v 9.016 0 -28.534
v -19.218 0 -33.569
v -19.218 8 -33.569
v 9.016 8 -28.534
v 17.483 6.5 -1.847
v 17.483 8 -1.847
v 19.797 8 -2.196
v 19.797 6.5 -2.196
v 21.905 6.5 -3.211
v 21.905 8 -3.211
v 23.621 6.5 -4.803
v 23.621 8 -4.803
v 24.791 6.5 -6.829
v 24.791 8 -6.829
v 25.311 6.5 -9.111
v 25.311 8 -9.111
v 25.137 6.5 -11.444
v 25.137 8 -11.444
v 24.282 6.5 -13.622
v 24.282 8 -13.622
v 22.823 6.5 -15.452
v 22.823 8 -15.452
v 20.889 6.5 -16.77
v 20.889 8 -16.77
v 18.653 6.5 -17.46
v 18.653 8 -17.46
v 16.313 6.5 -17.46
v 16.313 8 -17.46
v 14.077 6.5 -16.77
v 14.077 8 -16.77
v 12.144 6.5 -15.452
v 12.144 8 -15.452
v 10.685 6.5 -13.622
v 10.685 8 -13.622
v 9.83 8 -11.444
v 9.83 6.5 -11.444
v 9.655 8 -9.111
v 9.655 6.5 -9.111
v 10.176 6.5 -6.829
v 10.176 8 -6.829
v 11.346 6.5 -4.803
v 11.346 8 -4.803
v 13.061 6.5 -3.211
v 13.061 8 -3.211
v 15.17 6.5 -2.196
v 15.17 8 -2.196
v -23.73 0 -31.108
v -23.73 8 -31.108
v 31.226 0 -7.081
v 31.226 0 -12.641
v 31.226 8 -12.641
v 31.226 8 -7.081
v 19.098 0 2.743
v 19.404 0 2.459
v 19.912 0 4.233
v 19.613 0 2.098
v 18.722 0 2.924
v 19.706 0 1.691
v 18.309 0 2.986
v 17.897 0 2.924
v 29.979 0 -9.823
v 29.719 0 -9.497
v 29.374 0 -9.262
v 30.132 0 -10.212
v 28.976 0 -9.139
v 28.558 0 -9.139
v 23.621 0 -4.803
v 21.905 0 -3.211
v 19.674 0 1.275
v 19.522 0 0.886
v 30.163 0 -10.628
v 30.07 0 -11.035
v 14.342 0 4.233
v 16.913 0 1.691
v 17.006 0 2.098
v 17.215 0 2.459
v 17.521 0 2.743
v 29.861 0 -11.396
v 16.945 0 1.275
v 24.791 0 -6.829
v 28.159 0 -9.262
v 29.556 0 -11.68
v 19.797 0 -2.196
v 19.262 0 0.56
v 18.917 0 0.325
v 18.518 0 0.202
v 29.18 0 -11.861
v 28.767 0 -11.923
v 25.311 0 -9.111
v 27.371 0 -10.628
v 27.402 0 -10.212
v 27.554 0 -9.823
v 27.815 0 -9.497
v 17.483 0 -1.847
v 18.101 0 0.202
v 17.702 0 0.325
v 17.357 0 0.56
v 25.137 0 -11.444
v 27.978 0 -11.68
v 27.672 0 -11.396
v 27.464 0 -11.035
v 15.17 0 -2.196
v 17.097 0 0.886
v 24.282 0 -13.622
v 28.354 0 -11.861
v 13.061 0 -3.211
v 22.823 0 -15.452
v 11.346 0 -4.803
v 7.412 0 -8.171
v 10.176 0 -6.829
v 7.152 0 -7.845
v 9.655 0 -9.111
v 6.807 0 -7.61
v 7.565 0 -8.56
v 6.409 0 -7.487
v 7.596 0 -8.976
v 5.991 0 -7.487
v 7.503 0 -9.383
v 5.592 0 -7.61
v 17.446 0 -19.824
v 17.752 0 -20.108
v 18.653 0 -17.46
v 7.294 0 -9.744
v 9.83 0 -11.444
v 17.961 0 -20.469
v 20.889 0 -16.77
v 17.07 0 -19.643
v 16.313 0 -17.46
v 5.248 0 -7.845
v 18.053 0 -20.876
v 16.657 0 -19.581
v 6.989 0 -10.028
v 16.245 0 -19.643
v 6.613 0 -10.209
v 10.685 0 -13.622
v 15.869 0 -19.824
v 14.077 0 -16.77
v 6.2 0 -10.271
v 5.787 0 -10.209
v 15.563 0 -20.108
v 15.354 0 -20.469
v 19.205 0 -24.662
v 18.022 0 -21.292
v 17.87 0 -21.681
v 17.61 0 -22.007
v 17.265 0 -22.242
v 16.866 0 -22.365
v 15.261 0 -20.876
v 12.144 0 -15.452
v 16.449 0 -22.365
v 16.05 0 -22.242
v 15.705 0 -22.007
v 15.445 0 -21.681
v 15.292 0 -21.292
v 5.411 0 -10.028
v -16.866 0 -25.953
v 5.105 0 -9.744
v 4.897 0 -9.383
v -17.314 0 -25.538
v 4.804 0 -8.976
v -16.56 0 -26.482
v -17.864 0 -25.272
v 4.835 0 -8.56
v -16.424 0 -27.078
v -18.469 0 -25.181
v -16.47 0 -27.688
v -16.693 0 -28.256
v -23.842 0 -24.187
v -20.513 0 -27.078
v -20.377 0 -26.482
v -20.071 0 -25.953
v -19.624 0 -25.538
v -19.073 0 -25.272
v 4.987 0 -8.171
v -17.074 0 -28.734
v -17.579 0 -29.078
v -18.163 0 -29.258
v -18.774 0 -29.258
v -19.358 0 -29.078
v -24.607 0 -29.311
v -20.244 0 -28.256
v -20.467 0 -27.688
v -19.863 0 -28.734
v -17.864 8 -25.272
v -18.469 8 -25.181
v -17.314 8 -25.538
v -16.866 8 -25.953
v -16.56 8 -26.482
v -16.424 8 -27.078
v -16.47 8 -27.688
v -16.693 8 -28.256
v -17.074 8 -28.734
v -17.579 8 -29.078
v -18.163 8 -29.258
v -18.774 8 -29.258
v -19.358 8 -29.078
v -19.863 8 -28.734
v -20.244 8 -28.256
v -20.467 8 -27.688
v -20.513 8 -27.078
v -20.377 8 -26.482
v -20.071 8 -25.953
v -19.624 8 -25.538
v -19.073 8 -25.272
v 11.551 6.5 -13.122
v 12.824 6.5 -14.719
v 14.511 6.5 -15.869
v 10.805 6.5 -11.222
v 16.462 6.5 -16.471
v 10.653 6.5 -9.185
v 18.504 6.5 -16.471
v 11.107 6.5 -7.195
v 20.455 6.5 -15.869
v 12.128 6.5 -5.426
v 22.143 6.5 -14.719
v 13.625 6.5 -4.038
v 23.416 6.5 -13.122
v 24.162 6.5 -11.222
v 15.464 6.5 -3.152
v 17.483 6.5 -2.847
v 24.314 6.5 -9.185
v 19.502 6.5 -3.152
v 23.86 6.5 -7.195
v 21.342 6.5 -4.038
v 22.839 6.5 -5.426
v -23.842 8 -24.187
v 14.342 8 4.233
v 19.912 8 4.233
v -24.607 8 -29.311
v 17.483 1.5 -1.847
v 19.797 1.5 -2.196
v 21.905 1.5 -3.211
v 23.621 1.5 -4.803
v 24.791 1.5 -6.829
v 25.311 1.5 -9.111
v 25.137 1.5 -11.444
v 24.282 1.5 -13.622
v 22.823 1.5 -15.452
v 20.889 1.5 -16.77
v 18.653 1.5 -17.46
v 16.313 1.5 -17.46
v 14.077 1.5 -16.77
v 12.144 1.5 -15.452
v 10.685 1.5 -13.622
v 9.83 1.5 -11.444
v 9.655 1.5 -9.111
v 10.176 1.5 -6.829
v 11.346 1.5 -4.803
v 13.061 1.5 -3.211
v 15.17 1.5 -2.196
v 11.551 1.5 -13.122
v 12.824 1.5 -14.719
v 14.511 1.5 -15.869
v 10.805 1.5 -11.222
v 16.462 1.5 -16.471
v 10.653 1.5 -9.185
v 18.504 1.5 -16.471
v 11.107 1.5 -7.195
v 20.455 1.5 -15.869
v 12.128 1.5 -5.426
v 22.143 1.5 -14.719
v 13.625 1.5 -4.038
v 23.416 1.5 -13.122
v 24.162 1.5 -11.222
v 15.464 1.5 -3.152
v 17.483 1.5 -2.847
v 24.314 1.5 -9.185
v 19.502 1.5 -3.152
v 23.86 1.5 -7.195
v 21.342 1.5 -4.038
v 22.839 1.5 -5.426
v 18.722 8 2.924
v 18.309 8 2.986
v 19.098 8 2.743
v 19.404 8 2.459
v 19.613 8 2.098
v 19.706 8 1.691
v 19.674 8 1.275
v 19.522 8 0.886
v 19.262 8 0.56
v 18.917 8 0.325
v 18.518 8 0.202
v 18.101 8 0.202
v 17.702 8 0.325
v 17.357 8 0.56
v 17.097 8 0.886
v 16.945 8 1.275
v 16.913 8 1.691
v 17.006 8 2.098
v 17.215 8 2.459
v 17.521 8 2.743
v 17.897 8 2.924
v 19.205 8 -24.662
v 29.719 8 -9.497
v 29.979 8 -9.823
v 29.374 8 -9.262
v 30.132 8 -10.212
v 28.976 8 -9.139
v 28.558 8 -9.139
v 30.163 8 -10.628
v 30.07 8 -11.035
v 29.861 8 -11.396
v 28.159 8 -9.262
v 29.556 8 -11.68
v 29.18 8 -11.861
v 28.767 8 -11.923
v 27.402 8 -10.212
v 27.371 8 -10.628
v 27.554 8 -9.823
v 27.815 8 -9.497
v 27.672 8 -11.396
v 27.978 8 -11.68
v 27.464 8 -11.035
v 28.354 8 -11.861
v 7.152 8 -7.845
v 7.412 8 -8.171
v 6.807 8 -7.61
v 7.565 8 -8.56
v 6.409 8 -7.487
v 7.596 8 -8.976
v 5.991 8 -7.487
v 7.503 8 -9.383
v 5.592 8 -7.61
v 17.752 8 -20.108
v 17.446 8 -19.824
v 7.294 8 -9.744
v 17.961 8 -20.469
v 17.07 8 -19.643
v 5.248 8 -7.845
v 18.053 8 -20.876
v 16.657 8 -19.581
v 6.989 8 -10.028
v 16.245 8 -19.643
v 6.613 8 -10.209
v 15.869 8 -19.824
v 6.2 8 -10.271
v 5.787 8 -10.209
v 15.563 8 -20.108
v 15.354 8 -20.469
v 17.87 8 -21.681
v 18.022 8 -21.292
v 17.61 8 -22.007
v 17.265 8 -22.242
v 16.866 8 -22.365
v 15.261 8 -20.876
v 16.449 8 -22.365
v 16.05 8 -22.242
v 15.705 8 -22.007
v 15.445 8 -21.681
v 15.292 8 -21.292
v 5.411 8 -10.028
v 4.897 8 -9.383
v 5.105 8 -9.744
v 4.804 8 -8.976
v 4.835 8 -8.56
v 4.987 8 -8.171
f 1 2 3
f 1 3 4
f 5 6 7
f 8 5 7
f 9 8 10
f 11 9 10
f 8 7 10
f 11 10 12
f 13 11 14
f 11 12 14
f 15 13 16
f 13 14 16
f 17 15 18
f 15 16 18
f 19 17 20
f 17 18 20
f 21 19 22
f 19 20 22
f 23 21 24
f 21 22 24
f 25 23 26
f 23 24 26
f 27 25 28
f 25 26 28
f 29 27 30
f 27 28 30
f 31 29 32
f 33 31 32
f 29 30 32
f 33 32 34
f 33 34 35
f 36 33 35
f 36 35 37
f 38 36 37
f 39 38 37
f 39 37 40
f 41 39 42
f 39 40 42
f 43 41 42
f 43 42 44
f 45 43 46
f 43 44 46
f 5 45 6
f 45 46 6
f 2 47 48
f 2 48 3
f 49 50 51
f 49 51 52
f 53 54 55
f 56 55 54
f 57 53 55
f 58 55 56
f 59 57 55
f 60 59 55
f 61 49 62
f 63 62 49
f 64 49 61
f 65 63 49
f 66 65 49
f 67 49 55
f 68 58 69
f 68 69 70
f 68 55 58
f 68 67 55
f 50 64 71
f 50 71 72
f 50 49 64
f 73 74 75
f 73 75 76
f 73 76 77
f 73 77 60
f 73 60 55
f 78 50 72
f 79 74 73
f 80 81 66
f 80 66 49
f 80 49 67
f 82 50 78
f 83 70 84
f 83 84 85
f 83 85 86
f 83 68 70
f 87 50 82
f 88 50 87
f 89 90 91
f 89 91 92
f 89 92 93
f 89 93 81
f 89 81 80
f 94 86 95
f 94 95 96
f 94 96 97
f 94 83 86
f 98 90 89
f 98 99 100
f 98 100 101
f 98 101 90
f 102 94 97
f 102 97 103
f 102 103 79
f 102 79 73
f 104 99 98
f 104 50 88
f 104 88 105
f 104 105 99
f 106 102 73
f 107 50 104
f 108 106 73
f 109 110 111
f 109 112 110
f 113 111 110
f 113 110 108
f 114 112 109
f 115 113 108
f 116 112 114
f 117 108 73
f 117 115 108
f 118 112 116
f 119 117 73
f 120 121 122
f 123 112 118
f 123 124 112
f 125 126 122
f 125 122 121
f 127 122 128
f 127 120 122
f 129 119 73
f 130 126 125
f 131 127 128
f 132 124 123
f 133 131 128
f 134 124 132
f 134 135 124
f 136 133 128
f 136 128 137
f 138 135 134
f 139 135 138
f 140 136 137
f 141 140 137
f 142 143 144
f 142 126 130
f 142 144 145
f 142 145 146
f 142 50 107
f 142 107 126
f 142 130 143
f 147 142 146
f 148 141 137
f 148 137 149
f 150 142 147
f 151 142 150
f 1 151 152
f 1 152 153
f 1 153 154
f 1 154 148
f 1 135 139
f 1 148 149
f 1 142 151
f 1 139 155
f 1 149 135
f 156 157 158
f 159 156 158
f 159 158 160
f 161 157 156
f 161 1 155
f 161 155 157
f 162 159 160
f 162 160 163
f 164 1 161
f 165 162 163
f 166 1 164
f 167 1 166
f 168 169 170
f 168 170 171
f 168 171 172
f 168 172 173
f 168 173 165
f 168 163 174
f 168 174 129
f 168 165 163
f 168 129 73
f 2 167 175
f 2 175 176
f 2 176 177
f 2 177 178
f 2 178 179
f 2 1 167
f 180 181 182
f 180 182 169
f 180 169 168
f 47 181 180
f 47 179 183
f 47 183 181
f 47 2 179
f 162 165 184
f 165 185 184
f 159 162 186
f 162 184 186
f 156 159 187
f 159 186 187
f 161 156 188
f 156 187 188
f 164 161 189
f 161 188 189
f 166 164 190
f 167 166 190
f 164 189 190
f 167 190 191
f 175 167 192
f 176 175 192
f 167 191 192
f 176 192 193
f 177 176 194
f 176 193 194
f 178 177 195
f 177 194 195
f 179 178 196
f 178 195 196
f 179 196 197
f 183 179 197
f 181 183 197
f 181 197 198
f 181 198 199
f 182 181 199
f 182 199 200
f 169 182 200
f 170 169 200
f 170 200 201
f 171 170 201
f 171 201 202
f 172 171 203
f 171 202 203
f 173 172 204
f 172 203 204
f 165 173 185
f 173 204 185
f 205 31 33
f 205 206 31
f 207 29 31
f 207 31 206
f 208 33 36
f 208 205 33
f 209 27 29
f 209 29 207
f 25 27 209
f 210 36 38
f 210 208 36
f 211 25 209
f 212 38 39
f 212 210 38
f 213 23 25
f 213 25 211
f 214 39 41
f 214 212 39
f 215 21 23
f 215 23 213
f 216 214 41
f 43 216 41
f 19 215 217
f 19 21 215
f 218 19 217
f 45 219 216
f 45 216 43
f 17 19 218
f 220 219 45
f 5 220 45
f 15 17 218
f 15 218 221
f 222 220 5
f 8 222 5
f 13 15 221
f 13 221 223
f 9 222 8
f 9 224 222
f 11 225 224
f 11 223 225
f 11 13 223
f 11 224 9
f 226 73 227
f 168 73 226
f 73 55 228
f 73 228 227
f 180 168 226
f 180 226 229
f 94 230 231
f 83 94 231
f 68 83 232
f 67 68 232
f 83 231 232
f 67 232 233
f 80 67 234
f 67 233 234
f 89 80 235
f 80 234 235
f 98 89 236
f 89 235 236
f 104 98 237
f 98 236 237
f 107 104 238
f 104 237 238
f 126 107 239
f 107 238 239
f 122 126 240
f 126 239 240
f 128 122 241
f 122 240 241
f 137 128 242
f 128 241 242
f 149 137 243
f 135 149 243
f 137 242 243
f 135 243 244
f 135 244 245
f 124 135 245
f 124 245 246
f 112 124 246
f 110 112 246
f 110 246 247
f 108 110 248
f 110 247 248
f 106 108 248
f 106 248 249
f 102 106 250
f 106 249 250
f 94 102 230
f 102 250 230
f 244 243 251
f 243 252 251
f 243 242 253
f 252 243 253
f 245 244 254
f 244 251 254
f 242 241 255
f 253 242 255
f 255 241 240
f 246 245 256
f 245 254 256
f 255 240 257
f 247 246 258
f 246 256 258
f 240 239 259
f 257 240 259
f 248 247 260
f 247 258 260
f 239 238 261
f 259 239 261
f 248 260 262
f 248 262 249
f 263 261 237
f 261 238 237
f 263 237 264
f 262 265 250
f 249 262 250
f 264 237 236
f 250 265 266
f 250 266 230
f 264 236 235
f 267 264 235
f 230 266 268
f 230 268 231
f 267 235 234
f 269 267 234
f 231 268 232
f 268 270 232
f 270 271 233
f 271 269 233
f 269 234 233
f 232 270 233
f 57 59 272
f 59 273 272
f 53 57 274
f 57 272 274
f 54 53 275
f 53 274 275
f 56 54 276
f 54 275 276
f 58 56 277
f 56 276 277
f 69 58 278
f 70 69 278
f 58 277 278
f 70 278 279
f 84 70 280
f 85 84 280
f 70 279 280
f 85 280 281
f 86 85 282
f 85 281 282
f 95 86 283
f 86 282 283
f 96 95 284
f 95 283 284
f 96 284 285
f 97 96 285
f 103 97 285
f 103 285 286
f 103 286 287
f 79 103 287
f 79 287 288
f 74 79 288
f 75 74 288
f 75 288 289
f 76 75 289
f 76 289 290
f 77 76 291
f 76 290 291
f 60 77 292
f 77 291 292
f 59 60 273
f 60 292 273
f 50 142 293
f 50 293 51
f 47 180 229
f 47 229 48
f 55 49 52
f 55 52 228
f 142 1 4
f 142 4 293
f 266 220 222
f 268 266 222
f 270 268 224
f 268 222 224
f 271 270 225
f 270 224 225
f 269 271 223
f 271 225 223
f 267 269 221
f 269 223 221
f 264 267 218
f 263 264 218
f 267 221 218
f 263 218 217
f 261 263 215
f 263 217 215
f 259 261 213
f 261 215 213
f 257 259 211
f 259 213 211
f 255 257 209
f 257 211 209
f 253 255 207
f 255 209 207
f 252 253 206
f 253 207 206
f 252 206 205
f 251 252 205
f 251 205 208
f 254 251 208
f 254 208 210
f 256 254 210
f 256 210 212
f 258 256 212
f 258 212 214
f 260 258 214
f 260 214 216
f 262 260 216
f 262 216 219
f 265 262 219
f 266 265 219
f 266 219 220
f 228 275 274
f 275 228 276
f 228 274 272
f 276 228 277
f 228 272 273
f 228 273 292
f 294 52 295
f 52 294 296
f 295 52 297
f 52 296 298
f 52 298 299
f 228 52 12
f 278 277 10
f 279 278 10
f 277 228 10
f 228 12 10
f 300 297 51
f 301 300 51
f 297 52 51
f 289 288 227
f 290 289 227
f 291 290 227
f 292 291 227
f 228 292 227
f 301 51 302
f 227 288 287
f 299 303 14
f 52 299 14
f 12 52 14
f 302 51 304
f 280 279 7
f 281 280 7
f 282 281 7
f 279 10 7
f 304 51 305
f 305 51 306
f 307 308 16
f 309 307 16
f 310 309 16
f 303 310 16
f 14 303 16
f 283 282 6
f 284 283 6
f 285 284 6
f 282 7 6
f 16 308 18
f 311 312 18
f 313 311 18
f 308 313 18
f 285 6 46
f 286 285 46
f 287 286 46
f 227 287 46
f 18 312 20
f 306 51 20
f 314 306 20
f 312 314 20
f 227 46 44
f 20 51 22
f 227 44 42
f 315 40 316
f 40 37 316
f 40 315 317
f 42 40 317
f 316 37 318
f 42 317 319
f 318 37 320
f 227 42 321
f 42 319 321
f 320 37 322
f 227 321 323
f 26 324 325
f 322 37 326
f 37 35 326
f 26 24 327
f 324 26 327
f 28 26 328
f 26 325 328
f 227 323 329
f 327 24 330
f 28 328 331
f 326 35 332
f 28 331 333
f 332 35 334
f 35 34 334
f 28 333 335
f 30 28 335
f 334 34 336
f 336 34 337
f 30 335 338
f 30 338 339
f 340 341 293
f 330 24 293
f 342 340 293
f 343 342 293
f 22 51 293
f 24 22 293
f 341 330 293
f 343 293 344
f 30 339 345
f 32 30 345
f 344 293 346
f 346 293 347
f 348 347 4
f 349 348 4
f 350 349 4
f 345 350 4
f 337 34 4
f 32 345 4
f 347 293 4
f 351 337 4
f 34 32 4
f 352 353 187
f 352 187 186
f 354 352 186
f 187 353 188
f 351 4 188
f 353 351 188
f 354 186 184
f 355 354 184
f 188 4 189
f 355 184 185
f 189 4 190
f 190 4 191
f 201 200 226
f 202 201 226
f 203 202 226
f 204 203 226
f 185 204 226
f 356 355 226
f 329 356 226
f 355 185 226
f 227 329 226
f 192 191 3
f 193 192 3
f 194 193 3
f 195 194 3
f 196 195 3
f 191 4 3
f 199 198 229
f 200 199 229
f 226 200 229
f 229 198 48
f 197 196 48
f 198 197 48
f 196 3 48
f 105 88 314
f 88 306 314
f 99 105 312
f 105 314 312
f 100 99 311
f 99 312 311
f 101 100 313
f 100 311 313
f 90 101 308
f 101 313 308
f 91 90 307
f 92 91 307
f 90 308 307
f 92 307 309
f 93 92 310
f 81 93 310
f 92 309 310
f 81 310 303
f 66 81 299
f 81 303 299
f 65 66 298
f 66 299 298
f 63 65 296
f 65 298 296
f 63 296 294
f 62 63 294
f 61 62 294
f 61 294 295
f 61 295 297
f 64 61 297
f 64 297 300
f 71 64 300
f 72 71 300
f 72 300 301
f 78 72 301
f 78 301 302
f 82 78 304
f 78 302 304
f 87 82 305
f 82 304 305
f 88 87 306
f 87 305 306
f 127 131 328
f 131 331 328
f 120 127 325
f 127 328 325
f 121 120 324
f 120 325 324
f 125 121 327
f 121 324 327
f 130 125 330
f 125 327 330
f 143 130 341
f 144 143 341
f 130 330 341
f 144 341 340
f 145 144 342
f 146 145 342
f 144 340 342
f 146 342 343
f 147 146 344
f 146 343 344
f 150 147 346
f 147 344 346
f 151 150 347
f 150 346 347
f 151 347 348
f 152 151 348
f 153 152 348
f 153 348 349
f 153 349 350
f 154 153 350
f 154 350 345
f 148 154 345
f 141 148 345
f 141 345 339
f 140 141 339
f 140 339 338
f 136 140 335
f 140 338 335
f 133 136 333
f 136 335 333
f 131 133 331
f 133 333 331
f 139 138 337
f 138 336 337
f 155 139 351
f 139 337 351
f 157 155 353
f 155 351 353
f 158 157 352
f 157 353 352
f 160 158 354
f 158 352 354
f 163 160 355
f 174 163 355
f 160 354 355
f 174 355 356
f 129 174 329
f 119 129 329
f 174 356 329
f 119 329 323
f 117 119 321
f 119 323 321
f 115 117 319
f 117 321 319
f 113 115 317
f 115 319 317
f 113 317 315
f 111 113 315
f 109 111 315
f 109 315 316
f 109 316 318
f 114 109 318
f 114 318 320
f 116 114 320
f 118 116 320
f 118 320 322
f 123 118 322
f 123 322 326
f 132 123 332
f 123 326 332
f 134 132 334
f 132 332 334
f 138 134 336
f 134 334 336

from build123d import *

# Parameters (mm, degrees)
BOSS_EXTRUDE1_DEPTH = 8
SKETCH2_R           = 2.05
SKETCH2_R_2         = 6.85
CUT_EXTRUDE1_DEPTH  = 8
SKETCH2_4_R         = 7.85
SKETCH2_4_R_2       = 6.85
CUT_EXTRUDE2_DEPTH  = 1.5
CUT_EXTRUDE3_START  = -6.5
SKETCH2_5_R         = 7.85
SKETCH2_5_R_2       = 6.85
SKETCH2_5_R_3       = 2.05
SKETCH2_5_R_4       = 1.4
CUT_EXTRUDE3_DEPTH  = 1.5
SKETCH2_6_R         = 1.4
CUT_EXTRUDE4_DEPTH  = 10


with BuildPart() as part:
    # Sketch1 → Boss-Extrude1 (new body)
    with BuildSketch(Plane(origin=(0, 0, 0), x_dir=(1, 0, 0), z_dir=(0, 1, 0))):
        Polygon((31.226142903, 7.08081886), (19.912434404, -4.232889639), (14.342434404, -4.232889639), (-23.841936683, 24.187416566), (-24.606695271, 29.310652291), (-23.730266729, 31.108393377), (-19.218269492, 33.568524054), (9.016403464, 28.534078393), (19.205327622, 24.661634141), (31.226142903, 12.64081886), align=None)
    extrude(amount=BOSS_EXTRUDE1_DEPTH)

    # Sketch2 → Cut-Extrude1 (cut)
    with BuildSketch(Plane(origin=(0, 8, 0), x_dir=(1, 0, 0), z_dir=(0, 1, 0))):
        with Locations((-18.468718365, 27.231371116)):
            Circle(SKETCH2_R)
        with Locations((17.48339004, 9.697235801)):
            Circle(SKETCH2_R_2)
    extrude(amount=-CUT_EXTRUDE1_DEPTH, mode=Mode.SUBTRACT)

    # Sketch2<4> → Cut-Extrude2 (cut)
    with BuildSketch(Plane(origin=(0, 8, 0), x_dir=(1, 0, 0), z_dir=(0, 1, 0))):
        with Locations((17.48339004, 9.697235801)):
            Circle(SKETCH2_4_R)
        with Locations((17.48339004, 9.697235801)):
            Circle(SKETCH2_4_R_2, mode=Mode.SUBTRACT)
    extrude(amount=-CUT_EXTRUDE2_DEPTH, mode=Mode.SUBTRACT)

    # Sketch2<5> → Cut-Extrude3 (cut)
    # profile 1 of 6: a face of its own
    with BuildSketch(Plane(origin=(0, 8, 0), x_dir=(1, 0, 0), z_dir=(0, 1, 0)).offset(CUT_EXTRUDE3_START)):
        with Locations((17.48339004, 9.697235801)):
            Circle(SKETCH2_5_R)
        with Locations((17.48339004, 9.697235801)):
            Circle(SKETCH2_5_R_2, mode=Mode.SUBTRACT)
    # profile 2 of 6: a face of its own
    with BuildSketch(Plane(origin=(0, 8, 0), x_dir=(1, 0, 0), z_dir=(0, 1, 0)).offset(CUT_EXTRUDE3_START)):
        with Locations((-18.468718365, 27.231371116)):
            Circle(SKETCH2_5_R_3)
    # profile 3 of 6: a face of its own
    with BuildSketch(Plane(origin=(0, 8, 0), x_dir=(1, 0, 0), z_dir=(0, 1, 0)).offset(CUT_EXTRUDE3_START)):
        with Locations((16.657298103, 20.980744657)):
            Circle(SKETCH2_5_R_4)
    # profile 4 of 6: a face of its own
    with BuildSketch(Plane(origin=(0, 8, 0), x_dir=(1, 0, 0), z_dir=(0, 1, 0)).offset(CUT_EXTRUDE3_START)):
        with Locations((28.766898896, 10.523327737)):
            Circle(SKETCH2_5_R_4)
    # profile 5 of 6: a face of its own
    with BuildSketch(Plane(origin=(0, 8, 0), x_dir=(1, 0, 0), z_dir=(0, 1, 0)).offset(CUT_EXTRUDE3_START)):
        with Locations((6.199881183, 8.871143864)):
            Circle(SKETCH2_5_R_4)
    # profile 6 of 6: a face of its own
    with BuildSketch(Plane(origin=(0, 8, 0), x_dir=(1, 0, 0), z_dir=(0, 1, 0)).offset(CUT_EXTRUDE3_START)):
        with Locations((18.309481976, -1.586273056)):
            Circle(SKETCH2_5_R_4)
    extrude(amount=-CUT_EXTRUDE3_DEPTH, mode=Mode.SUBTRACT)

    # Sketch2<6> → Cut-Extrude4 (cut)
    with BuildSketch(Plane(origin=(0, 8, 0), x_dir=(1, 0, 0), z_dir=(0, 1, 0))):
        with Locations((16.657298103, 20.980744657)):
            Circle(SKETCH2_6_R)
        with Locations((28.766898896, 10.523327737)):
            Circle(SKETCH2_6_R)
        with Locations((6.199881183, 8.871143864)):
            Circle(SKETCH2_6_R)
        with Locations((18.309481976, -1.586273056)):
            Circle(SKETCH2_6_R)
    extrude(amount=-CUT_EXTRUDE4_DEPTH, mode=Mode.SUBTRACT)


solid = part.part
